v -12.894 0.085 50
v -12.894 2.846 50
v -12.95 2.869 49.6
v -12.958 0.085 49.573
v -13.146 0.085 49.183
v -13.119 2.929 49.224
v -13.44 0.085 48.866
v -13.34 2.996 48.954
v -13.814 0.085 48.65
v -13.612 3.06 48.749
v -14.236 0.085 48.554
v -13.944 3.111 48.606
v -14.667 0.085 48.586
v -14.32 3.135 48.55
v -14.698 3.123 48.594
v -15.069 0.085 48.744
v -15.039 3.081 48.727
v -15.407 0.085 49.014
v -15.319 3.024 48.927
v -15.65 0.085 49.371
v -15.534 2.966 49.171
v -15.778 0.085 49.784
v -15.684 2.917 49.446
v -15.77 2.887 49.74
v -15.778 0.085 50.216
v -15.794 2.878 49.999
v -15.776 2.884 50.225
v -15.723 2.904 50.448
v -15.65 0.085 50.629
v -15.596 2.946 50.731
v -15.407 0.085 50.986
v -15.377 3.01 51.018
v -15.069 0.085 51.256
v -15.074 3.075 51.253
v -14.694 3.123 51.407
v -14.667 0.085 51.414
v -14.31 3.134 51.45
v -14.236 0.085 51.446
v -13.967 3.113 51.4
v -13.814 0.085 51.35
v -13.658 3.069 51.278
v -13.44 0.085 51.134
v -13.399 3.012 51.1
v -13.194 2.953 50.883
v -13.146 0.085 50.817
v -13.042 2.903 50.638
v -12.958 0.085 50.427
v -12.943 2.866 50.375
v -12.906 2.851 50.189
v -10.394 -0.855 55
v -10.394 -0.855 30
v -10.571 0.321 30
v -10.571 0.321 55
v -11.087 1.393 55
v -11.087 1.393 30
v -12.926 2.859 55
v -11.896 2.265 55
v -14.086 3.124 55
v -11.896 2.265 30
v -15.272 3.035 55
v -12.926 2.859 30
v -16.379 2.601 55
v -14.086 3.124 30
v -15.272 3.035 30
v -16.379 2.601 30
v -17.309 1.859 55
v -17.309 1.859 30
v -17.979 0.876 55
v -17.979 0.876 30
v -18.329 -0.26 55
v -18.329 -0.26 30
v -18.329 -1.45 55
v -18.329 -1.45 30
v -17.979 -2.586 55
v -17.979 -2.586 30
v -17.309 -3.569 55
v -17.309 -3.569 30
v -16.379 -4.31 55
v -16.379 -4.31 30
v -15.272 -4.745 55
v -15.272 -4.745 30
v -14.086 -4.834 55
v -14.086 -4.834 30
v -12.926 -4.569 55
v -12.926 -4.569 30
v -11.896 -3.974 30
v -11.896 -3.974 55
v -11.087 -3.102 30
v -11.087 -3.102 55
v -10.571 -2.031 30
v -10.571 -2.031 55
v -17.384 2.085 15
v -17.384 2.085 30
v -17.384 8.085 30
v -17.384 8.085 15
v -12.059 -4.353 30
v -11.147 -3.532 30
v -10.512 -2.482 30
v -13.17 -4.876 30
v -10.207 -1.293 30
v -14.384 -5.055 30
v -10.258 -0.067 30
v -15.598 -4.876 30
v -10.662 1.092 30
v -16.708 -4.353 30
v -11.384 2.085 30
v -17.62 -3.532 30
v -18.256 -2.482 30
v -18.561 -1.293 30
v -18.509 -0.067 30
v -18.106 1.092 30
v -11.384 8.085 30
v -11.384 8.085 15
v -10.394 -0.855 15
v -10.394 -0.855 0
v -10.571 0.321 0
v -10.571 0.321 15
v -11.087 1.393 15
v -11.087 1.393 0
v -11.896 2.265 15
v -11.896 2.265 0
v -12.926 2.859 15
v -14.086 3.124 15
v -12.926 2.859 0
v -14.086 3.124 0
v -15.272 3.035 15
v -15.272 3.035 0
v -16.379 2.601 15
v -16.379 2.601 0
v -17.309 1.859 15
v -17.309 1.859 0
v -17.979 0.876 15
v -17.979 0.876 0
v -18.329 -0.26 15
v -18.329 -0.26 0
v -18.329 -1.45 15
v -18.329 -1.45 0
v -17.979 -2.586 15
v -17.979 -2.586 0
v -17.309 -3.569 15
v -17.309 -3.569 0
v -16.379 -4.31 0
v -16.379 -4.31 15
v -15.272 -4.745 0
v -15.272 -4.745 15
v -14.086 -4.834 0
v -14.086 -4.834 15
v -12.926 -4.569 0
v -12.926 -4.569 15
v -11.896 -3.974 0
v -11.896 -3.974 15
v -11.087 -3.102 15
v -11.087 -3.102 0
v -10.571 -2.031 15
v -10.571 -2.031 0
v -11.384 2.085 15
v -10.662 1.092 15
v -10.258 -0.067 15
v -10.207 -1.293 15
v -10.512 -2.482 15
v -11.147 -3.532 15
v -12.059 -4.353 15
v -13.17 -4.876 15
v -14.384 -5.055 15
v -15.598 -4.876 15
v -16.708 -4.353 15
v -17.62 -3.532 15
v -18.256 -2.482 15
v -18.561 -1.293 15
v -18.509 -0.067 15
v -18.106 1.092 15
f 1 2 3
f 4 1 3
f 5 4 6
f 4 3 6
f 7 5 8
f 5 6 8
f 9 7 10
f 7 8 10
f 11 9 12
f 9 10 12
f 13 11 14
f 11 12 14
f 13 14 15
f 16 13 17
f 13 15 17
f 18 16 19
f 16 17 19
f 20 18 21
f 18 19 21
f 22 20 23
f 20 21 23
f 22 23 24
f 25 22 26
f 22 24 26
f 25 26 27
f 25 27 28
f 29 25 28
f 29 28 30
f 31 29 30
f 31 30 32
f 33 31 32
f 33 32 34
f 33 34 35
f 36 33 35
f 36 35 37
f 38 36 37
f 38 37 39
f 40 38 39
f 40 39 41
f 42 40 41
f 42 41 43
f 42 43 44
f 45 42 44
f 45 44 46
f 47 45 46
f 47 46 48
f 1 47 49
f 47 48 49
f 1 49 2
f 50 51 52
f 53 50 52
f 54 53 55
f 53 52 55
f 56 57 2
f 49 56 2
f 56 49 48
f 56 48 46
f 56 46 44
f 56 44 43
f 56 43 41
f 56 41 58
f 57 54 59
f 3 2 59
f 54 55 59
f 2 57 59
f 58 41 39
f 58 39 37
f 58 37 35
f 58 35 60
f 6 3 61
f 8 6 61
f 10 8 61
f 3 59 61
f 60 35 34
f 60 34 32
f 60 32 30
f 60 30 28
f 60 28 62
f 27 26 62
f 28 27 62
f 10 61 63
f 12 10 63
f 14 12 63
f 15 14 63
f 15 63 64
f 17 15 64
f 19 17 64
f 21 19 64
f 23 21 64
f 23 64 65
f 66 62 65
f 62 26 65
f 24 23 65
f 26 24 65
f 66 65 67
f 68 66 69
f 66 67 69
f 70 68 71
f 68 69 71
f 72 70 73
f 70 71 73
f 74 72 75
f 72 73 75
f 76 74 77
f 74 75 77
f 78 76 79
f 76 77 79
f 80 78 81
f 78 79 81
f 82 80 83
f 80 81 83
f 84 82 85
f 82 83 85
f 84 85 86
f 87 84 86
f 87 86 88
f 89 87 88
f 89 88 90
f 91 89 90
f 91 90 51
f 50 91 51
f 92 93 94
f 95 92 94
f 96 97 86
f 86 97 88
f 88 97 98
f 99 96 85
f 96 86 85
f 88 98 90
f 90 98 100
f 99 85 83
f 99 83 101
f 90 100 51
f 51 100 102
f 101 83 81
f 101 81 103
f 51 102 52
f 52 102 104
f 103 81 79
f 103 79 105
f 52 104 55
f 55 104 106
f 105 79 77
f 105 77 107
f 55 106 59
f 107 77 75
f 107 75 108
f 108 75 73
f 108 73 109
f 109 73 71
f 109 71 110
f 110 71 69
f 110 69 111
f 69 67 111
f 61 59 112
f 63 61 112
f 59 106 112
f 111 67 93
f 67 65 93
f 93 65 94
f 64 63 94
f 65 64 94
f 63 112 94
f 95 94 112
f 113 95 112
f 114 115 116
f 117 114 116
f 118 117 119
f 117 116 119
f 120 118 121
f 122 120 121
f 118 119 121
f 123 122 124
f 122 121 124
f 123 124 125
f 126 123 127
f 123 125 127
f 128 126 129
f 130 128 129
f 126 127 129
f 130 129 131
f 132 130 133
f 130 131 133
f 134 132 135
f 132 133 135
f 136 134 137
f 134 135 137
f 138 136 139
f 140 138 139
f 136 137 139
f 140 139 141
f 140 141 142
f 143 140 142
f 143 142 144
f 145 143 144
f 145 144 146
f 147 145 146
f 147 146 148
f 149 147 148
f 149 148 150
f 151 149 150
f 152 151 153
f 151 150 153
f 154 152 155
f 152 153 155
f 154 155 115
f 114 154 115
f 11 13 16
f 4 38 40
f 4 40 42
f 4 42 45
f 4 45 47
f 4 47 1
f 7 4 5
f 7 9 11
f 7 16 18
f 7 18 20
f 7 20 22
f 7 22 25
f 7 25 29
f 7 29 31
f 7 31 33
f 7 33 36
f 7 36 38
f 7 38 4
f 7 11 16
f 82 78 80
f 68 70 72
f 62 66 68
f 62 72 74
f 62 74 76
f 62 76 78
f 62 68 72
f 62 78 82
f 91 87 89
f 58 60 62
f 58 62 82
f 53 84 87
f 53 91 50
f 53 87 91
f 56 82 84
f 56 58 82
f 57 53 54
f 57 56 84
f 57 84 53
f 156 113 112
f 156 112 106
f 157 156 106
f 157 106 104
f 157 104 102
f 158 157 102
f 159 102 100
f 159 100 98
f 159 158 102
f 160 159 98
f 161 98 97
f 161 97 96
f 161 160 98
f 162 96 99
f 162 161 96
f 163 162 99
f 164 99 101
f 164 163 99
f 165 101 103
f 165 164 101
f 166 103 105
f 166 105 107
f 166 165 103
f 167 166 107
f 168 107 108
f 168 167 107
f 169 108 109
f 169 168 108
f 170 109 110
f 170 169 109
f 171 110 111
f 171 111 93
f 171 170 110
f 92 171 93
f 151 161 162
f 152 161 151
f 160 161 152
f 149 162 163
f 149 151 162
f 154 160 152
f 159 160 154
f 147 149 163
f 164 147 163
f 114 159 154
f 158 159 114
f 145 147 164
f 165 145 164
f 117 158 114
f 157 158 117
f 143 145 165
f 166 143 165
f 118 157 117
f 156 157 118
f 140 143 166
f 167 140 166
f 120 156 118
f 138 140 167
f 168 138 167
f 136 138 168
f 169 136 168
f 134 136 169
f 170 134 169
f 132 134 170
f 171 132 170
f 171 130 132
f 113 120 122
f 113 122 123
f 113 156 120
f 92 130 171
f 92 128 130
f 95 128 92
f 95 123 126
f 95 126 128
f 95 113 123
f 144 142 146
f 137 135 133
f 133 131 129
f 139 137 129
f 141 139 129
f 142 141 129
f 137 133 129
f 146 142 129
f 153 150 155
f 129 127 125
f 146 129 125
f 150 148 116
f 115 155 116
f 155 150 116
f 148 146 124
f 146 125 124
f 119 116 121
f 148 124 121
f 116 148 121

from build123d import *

# Parameters (mm, degrees)
SKETCH1_R           = 3.99
BOSS_EXTRUDE1_DEPTH = 15
BOSS_EXTRUDE7_DEPTH = 15
SKETCH7_R           = 3.99
BOSS_EXTRUDE8_DEPTH = 25
SKETCH8_R           = 1.45
CUT_EXTRUDE1_DEPTH  = 8


with BuildPart() as part:
    # Sketch1 → Boss-Extrude1 (new body)
    with BuildSketch(Plane.XY):
        with Locations((-14.383915809, -0.854852817)):
            Circle(SKETCH1_R)
    extrude(amount=BOSS_EXTRUDE1_DEPTH)

    # Sketch6 → Boss-Extrude7 (add)
    with BuildSketch(Plane.XY.offset(15)):
        with BuildLine():
            Line((-17.383915809, 2.084534875), (-17.383915809, 8.084534875))
            Line((-17.383915809, 8.084534875), (-11.383915809, 8.084534875))
            Line((-11.383915809, 8.084534875), (-11.383915809, 2.084534875))
            ThreePointArc((-11.383915809, 2.084534875), (-14.383915809, -5.054852817), (-17.383915809, 2.084534875))
        make_face()
    extrude(amount=BOSS_EXTRUDE7_DEPTH)

    # Sketch7 → Boss-Extrude8 (add)
    with BuildSketch(Plane.XY.offset(30)):
        with Locations((-14.383915809, -0.854852817)):
            Circle(SKETCH7_R)
    extrude(amount=BOSS_EXTRUDE8_DEPTH)

    # Sketch8 → Cut-Extrude1 (cut)
    with BuildSketch(Plane(origin=(0, 8.084534875, 0), x_dir=(1, 0, 0), z_dir=(0, 1, 0))):
        with Locations((-14.343915809, -50)):
            Circle(SKETCH8_R)
    extrude(amount=-CUT_EXTRUDE1_DEPTH, mode=Mode.SUBTRACT)


solid = part.part
